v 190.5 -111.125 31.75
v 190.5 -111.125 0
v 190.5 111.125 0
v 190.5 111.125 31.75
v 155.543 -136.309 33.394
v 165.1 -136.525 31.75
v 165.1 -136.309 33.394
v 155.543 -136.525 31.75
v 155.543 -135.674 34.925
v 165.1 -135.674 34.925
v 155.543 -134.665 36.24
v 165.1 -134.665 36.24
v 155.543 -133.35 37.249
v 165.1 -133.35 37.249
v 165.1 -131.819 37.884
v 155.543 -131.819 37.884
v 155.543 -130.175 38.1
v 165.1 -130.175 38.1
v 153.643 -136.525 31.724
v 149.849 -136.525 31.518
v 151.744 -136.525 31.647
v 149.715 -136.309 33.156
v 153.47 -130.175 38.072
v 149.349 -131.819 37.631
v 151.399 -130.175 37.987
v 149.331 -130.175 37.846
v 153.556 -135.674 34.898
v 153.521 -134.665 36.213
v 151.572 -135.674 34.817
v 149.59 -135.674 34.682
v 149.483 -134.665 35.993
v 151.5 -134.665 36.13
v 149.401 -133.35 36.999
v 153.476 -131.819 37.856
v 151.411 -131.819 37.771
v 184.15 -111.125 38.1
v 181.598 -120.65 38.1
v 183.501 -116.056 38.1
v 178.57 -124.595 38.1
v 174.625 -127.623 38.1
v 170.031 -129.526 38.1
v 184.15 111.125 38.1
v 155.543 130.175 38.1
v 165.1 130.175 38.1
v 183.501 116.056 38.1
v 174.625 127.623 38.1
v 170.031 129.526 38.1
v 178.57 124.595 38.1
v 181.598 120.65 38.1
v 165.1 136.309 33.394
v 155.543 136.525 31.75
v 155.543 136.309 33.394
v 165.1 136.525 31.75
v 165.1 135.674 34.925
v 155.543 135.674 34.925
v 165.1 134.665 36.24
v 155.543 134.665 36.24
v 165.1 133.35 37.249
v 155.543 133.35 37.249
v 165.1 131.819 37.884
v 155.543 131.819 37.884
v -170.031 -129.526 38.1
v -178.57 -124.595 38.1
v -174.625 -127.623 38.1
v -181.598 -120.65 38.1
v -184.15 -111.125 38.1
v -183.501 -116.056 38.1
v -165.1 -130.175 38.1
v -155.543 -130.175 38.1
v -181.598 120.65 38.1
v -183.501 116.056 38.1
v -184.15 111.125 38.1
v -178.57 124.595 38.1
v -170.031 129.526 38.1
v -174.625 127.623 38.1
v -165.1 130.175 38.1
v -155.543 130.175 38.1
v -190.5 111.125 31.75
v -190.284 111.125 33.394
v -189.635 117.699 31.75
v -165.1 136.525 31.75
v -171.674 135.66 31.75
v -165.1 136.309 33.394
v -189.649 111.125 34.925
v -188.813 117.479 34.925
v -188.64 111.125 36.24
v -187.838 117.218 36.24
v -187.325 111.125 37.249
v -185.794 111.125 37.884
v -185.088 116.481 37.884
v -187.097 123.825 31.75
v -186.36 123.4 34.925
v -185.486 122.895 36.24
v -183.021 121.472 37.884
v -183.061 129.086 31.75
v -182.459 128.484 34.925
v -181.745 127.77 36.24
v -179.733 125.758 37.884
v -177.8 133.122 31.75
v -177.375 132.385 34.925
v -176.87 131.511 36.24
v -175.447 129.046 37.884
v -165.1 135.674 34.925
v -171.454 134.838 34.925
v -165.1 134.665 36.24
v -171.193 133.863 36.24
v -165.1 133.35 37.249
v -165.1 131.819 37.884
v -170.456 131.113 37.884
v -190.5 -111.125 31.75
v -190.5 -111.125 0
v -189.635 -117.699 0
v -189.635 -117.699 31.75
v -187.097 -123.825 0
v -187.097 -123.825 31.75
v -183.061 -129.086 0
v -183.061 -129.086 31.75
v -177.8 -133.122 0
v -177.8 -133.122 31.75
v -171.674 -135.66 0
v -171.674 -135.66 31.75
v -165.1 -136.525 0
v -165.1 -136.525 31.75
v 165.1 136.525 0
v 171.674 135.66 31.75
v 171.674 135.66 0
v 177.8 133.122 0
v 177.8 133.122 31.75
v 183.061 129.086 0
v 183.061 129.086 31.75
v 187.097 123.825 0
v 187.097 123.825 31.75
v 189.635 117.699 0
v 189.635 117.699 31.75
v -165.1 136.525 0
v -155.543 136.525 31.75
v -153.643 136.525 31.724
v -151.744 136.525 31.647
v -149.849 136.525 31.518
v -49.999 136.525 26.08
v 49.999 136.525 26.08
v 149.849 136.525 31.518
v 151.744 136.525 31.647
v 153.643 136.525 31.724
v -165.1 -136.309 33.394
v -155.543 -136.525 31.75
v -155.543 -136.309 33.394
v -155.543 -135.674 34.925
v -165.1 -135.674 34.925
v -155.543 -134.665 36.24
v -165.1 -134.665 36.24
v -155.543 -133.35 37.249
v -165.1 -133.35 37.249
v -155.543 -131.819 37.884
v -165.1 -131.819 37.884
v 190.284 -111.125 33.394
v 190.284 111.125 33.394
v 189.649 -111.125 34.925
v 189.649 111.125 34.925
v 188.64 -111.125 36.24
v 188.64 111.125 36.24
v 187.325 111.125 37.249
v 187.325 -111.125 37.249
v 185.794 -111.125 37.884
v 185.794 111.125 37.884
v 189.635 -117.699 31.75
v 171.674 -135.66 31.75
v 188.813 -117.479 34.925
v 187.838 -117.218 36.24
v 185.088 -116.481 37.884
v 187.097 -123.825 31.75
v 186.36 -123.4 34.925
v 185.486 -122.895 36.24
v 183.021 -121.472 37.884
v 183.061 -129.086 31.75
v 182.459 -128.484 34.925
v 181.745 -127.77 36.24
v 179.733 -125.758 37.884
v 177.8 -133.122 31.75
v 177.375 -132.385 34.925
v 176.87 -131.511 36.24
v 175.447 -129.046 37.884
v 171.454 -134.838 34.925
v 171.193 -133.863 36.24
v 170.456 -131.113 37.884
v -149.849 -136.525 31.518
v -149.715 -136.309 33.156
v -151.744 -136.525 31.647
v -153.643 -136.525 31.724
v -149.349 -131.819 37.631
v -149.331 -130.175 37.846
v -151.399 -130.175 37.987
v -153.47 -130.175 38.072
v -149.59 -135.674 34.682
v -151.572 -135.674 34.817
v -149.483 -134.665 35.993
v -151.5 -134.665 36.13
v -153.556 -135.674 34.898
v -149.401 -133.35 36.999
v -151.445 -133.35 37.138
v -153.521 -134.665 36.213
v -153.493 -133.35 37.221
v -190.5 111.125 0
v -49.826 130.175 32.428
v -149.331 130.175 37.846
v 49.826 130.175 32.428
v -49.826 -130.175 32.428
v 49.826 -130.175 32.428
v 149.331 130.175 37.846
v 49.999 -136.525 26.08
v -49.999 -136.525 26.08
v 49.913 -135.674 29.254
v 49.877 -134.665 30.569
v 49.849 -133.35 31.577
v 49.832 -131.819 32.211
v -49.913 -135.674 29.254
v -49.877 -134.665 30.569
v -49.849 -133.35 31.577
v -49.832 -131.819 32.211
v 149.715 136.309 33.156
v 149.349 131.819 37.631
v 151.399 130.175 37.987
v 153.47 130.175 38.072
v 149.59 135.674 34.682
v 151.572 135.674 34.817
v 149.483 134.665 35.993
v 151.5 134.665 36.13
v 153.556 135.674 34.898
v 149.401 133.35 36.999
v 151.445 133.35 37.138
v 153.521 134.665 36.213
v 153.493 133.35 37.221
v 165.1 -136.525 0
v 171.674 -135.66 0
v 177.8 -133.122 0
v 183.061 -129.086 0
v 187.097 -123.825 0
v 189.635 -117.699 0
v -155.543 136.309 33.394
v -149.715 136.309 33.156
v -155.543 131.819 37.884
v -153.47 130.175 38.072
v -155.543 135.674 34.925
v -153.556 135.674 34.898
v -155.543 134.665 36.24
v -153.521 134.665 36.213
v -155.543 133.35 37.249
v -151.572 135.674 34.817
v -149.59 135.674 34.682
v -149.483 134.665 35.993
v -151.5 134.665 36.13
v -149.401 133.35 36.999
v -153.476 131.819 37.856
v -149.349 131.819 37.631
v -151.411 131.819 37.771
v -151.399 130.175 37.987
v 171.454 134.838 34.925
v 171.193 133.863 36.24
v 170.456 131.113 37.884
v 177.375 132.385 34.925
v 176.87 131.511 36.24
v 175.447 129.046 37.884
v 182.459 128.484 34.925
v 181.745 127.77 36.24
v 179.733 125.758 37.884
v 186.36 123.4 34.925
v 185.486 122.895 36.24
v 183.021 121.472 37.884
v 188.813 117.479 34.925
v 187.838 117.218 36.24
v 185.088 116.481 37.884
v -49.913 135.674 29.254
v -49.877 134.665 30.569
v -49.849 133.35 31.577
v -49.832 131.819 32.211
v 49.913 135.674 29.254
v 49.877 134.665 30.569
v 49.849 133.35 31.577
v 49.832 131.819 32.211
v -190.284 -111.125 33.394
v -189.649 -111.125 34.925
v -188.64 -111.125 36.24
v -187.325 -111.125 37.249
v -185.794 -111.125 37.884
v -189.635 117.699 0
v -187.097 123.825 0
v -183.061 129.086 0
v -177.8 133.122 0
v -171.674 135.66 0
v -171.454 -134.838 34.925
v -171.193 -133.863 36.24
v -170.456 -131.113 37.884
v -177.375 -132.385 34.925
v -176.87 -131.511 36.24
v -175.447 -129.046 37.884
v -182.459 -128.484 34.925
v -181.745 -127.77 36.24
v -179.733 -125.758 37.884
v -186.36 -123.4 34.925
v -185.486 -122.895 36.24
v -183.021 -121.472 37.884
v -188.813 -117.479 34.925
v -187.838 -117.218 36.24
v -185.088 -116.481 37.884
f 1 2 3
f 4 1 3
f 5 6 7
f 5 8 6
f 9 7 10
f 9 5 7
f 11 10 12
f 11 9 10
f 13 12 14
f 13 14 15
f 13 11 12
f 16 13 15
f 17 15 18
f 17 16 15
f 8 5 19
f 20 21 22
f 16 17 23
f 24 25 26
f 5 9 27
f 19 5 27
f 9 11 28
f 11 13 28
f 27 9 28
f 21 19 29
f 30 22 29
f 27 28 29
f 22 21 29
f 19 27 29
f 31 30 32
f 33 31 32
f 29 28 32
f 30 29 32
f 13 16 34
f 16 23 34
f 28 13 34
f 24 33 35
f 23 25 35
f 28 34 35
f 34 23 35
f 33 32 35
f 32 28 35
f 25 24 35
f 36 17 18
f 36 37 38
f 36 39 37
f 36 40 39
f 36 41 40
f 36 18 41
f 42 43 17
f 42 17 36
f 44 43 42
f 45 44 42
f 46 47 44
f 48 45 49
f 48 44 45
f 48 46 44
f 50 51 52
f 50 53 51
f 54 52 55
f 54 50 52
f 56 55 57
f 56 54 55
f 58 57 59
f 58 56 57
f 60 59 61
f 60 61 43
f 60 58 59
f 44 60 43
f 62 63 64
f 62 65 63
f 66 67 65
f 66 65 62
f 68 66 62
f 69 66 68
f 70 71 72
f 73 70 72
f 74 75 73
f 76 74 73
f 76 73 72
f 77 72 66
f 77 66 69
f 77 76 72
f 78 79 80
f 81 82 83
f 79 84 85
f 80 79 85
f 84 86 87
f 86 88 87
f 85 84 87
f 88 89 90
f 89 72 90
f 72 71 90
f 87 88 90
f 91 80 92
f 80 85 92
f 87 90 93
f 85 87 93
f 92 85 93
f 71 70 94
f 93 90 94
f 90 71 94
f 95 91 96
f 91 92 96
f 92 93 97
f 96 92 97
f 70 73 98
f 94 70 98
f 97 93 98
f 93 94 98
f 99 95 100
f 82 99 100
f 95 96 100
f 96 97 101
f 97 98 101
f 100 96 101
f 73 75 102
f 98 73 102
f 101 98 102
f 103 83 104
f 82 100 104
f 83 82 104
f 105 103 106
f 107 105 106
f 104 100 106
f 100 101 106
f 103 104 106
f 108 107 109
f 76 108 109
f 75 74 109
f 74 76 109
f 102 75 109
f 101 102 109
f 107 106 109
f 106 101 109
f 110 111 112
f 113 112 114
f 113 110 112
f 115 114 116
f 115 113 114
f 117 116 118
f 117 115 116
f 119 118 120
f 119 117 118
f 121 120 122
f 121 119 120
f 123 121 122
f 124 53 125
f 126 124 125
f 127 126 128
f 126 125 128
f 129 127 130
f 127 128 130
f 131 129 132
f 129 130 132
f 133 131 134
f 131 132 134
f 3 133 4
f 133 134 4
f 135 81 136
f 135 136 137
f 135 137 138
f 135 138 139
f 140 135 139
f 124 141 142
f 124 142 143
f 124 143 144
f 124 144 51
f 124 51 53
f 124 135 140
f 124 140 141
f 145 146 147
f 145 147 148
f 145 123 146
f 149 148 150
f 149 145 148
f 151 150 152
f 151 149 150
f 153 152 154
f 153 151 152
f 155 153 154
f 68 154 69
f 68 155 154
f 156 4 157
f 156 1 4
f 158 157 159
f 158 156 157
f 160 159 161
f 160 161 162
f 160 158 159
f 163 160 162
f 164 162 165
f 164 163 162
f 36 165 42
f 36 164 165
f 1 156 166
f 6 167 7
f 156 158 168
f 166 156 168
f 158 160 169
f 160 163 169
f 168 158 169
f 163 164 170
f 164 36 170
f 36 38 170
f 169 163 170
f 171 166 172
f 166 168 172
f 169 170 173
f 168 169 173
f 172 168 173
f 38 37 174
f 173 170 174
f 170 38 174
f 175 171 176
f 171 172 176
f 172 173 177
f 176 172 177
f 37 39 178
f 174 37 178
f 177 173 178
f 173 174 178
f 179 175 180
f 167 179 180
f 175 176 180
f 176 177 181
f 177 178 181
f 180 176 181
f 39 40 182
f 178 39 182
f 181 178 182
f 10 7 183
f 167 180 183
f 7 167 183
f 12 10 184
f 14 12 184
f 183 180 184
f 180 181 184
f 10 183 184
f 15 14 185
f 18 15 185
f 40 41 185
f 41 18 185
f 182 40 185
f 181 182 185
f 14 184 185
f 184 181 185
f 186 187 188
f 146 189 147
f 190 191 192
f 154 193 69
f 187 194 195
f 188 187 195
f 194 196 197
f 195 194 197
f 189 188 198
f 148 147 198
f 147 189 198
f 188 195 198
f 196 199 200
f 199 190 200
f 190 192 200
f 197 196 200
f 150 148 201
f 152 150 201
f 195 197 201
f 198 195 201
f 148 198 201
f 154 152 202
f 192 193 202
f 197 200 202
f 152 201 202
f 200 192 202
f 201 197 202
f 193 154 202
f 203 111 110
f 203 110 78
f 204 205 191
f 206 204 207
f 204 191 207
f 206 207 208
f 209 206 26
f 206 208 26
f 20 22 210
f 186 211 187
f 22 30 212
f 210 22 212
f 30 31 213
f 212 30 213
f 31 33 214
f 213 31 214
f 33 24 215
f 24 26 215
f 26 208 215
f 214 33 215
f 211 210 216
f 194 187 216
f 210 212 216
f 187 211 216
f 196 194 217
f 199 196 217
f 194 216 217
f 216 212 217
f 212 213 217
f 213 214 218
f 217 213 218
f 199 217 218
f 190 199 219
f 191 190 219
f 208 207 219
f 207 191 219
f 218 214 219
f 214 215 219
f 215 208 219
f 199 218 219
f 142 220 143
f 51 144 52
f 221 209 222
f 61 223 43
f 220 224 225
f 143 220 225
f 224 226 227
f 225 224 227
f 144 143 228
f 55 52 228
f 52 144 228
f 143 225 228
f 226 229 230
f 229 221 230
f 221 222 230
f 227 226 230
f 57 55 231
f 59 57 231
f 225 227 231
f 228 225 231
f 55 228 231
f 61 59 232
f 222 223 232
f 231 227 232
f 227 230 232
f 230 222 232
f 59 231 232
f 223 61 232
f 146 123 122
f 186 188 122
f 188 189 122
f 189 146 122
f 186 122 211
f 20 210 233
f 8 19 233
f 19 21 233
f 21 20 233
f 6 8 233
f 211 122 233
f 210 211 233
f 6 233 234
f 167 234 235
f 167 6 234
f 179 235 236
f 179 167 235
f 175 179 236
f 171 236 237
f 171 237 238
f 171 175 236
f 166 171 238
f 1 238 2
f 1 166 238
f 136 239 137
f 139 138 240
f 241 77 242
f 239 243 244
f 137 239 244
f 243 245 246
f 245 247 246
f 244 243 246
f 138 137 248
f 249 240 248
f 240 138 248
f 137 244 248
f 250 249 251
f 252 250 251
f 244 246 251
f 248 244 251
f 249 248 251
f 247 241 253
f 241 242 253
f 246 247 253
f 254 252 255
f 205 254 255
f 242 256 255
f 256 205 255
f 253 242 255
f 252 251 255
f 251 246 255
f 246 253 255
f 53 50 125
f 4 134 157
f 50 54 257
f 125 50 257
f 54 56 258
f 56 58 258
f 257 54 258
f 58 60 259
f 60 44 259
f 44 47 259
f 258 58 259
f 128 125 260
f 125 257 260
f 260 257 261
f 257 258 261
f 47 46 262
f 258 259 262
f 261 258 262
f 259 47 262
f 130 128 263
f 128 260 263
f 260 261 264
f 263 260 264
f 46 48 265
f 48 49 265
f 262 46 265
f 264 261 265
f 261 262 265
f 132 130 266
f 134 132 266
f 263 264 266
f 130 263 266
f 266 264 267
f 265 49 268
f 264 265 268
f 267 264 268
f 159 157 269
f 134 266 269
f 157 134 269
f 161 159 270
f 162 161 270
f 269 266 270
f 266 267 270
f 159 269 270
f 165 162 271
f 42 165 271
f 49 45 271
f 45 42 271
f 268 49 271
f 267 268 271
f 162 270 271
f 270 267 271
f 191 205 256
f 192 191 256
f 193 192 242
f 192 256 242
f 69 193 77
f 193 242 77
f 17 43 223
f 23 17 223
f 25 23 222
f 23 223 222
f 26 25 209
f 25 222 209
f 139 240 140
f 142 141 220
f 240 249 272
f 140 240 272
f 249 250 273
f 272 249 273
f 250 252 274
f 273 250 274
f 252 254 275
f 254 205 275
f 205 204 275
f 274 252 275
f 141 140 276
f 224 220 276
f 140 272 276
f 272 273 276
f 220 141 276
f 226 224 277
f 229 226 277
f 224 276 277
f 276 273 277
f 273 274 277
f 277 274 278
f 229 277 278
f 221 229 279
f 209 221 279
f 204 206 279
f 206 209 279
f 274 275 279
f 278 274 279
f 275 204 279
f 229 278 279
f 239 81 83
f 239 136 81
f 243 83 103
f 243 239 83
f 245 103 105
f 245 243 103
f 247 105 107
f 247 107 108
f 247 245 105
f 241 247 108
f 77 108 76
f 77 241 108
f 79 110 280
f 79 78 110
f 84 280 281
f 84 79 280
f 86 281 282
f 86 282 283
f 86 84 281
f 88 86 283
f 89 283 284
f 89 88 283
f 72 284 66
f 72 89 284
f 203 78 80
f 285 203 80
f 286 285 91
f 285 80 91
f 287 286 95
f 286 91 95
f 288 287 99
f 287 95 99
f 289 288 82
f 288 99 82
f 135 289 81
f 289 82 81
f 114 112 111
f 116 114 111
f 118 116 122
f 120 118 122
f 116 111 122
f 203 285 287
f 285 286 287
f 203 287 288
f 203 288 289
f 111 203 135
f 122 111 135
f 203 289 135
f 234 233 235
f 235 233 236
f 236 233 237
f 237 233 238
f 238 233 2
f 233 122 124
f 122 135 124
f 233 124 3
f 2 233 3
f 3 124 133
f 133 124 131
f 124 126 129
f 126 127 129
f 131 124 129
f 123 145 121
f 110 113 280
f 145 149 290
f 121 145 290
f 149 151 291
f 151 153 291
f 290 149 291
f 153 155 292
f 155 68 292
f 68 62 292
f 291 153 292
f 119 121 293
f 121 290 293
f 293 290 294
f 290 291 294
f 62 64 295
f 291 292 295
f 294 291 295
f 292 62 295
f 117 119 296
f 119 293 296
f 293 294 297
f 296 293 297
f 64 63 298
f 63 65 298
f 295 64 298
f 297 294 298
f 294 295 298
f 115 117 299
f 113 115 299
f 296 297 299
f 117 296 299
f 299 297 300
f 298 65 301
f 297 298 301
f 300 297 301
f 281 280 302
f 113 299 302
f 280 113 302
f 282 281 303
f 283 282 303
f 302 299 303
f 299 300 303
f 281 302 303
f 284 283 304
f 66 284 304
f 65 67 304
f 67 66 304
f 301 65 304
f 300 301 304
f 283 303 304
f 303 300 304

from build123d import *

# Parameters (mm, degrees)
F0_W        = 381
F0_H        = 273.05
F1_DEPTH    = 38.1
F3_DEPTH    = 273.051
F4_T1_DEPTH = 288.7629933337
F5_R        = 25.4
F6_R        = 6.35


# Not quite as in the source:
# - a fillet or chamfer that OpenCascade refuses, or shapes differently, is made with other operations: its cross-section is extruded or revolved along the edge and cut away or added


with BuildPart() as f1:
    # F0 (on Top) → F1 (new body)
    with BuildSketch(Plane.XY):
        Rectangle(F0_W, F0_H)
    extrude(amount=F1_DEPTH)

    # F2 (on face) → F3 (cut, through all)
    with BuildSketch(Plane.XZ.offset(136.525)):
        with BuildLine():
            Line((152.4, 38.1), (-152.4, 38.1))
            ThreePointArc((-152.4, 38.1), (0, 31.75), (152.4, 38.1))
        make_face()
    extrude(amount=-F3_DEPTH, mode=Mode.SUBTRACT)

    # F4: fillet of radius 76.2 on 2 edges, made by hand

    # F4_s2 → F4_t1 (cut)
    with BuildSketch(Plane.XZ.offset(-144.3814966668)):
        with BuildLine():
            ThreePointArc((155.5425986667, 38.1), (152.4343358341, 38.0365792649), (149.3312469729, 37.846422629))
            ThreePointArc((149.3312469729, 37.846422629), (150.8656767636, 37.9725665634), (152.4, 38.1))
            Line((152.4, 38.1), (155.5425986667, 38.1))
        make_face()
        with BuildLine():
            ThreePointArc((-149.3312469729, 37.846422629), (-152.4343358341, 38.0365792649), (-155.5425986667, 38.1))
            Line((-155.5425986667, 38.1), (-152.4, 38.1))
            ThreePointArc((-152.4, 38.1), (-150.8656767636, 37.9725665634), (-149.3312469729, 37.846422629))
        make_face()
    extrude(amount=F4_T1_DEPTH, mode=Mode.SUBTRACT)

    # F5
    f5_edges = [f1.edges().sort_by_distance(p)[0] for p in [
        (-190.5, -136.525, 19.05),
        (190.5, -136.525, 19.05),
        (190.5, 136.525, 19.05),
        (-190.5, 136.525, 19.05),
    ]]
    fillet(f5_edges, radius=F5_R)

    # F6
    f6_edges = [f1.edges().sort_by_distance(p)[0] for p in [
        (160.321299, 136.525, 38.1),
    ]]
    fillet(f6_edges, radius=F6_R)


solid = f1.part
